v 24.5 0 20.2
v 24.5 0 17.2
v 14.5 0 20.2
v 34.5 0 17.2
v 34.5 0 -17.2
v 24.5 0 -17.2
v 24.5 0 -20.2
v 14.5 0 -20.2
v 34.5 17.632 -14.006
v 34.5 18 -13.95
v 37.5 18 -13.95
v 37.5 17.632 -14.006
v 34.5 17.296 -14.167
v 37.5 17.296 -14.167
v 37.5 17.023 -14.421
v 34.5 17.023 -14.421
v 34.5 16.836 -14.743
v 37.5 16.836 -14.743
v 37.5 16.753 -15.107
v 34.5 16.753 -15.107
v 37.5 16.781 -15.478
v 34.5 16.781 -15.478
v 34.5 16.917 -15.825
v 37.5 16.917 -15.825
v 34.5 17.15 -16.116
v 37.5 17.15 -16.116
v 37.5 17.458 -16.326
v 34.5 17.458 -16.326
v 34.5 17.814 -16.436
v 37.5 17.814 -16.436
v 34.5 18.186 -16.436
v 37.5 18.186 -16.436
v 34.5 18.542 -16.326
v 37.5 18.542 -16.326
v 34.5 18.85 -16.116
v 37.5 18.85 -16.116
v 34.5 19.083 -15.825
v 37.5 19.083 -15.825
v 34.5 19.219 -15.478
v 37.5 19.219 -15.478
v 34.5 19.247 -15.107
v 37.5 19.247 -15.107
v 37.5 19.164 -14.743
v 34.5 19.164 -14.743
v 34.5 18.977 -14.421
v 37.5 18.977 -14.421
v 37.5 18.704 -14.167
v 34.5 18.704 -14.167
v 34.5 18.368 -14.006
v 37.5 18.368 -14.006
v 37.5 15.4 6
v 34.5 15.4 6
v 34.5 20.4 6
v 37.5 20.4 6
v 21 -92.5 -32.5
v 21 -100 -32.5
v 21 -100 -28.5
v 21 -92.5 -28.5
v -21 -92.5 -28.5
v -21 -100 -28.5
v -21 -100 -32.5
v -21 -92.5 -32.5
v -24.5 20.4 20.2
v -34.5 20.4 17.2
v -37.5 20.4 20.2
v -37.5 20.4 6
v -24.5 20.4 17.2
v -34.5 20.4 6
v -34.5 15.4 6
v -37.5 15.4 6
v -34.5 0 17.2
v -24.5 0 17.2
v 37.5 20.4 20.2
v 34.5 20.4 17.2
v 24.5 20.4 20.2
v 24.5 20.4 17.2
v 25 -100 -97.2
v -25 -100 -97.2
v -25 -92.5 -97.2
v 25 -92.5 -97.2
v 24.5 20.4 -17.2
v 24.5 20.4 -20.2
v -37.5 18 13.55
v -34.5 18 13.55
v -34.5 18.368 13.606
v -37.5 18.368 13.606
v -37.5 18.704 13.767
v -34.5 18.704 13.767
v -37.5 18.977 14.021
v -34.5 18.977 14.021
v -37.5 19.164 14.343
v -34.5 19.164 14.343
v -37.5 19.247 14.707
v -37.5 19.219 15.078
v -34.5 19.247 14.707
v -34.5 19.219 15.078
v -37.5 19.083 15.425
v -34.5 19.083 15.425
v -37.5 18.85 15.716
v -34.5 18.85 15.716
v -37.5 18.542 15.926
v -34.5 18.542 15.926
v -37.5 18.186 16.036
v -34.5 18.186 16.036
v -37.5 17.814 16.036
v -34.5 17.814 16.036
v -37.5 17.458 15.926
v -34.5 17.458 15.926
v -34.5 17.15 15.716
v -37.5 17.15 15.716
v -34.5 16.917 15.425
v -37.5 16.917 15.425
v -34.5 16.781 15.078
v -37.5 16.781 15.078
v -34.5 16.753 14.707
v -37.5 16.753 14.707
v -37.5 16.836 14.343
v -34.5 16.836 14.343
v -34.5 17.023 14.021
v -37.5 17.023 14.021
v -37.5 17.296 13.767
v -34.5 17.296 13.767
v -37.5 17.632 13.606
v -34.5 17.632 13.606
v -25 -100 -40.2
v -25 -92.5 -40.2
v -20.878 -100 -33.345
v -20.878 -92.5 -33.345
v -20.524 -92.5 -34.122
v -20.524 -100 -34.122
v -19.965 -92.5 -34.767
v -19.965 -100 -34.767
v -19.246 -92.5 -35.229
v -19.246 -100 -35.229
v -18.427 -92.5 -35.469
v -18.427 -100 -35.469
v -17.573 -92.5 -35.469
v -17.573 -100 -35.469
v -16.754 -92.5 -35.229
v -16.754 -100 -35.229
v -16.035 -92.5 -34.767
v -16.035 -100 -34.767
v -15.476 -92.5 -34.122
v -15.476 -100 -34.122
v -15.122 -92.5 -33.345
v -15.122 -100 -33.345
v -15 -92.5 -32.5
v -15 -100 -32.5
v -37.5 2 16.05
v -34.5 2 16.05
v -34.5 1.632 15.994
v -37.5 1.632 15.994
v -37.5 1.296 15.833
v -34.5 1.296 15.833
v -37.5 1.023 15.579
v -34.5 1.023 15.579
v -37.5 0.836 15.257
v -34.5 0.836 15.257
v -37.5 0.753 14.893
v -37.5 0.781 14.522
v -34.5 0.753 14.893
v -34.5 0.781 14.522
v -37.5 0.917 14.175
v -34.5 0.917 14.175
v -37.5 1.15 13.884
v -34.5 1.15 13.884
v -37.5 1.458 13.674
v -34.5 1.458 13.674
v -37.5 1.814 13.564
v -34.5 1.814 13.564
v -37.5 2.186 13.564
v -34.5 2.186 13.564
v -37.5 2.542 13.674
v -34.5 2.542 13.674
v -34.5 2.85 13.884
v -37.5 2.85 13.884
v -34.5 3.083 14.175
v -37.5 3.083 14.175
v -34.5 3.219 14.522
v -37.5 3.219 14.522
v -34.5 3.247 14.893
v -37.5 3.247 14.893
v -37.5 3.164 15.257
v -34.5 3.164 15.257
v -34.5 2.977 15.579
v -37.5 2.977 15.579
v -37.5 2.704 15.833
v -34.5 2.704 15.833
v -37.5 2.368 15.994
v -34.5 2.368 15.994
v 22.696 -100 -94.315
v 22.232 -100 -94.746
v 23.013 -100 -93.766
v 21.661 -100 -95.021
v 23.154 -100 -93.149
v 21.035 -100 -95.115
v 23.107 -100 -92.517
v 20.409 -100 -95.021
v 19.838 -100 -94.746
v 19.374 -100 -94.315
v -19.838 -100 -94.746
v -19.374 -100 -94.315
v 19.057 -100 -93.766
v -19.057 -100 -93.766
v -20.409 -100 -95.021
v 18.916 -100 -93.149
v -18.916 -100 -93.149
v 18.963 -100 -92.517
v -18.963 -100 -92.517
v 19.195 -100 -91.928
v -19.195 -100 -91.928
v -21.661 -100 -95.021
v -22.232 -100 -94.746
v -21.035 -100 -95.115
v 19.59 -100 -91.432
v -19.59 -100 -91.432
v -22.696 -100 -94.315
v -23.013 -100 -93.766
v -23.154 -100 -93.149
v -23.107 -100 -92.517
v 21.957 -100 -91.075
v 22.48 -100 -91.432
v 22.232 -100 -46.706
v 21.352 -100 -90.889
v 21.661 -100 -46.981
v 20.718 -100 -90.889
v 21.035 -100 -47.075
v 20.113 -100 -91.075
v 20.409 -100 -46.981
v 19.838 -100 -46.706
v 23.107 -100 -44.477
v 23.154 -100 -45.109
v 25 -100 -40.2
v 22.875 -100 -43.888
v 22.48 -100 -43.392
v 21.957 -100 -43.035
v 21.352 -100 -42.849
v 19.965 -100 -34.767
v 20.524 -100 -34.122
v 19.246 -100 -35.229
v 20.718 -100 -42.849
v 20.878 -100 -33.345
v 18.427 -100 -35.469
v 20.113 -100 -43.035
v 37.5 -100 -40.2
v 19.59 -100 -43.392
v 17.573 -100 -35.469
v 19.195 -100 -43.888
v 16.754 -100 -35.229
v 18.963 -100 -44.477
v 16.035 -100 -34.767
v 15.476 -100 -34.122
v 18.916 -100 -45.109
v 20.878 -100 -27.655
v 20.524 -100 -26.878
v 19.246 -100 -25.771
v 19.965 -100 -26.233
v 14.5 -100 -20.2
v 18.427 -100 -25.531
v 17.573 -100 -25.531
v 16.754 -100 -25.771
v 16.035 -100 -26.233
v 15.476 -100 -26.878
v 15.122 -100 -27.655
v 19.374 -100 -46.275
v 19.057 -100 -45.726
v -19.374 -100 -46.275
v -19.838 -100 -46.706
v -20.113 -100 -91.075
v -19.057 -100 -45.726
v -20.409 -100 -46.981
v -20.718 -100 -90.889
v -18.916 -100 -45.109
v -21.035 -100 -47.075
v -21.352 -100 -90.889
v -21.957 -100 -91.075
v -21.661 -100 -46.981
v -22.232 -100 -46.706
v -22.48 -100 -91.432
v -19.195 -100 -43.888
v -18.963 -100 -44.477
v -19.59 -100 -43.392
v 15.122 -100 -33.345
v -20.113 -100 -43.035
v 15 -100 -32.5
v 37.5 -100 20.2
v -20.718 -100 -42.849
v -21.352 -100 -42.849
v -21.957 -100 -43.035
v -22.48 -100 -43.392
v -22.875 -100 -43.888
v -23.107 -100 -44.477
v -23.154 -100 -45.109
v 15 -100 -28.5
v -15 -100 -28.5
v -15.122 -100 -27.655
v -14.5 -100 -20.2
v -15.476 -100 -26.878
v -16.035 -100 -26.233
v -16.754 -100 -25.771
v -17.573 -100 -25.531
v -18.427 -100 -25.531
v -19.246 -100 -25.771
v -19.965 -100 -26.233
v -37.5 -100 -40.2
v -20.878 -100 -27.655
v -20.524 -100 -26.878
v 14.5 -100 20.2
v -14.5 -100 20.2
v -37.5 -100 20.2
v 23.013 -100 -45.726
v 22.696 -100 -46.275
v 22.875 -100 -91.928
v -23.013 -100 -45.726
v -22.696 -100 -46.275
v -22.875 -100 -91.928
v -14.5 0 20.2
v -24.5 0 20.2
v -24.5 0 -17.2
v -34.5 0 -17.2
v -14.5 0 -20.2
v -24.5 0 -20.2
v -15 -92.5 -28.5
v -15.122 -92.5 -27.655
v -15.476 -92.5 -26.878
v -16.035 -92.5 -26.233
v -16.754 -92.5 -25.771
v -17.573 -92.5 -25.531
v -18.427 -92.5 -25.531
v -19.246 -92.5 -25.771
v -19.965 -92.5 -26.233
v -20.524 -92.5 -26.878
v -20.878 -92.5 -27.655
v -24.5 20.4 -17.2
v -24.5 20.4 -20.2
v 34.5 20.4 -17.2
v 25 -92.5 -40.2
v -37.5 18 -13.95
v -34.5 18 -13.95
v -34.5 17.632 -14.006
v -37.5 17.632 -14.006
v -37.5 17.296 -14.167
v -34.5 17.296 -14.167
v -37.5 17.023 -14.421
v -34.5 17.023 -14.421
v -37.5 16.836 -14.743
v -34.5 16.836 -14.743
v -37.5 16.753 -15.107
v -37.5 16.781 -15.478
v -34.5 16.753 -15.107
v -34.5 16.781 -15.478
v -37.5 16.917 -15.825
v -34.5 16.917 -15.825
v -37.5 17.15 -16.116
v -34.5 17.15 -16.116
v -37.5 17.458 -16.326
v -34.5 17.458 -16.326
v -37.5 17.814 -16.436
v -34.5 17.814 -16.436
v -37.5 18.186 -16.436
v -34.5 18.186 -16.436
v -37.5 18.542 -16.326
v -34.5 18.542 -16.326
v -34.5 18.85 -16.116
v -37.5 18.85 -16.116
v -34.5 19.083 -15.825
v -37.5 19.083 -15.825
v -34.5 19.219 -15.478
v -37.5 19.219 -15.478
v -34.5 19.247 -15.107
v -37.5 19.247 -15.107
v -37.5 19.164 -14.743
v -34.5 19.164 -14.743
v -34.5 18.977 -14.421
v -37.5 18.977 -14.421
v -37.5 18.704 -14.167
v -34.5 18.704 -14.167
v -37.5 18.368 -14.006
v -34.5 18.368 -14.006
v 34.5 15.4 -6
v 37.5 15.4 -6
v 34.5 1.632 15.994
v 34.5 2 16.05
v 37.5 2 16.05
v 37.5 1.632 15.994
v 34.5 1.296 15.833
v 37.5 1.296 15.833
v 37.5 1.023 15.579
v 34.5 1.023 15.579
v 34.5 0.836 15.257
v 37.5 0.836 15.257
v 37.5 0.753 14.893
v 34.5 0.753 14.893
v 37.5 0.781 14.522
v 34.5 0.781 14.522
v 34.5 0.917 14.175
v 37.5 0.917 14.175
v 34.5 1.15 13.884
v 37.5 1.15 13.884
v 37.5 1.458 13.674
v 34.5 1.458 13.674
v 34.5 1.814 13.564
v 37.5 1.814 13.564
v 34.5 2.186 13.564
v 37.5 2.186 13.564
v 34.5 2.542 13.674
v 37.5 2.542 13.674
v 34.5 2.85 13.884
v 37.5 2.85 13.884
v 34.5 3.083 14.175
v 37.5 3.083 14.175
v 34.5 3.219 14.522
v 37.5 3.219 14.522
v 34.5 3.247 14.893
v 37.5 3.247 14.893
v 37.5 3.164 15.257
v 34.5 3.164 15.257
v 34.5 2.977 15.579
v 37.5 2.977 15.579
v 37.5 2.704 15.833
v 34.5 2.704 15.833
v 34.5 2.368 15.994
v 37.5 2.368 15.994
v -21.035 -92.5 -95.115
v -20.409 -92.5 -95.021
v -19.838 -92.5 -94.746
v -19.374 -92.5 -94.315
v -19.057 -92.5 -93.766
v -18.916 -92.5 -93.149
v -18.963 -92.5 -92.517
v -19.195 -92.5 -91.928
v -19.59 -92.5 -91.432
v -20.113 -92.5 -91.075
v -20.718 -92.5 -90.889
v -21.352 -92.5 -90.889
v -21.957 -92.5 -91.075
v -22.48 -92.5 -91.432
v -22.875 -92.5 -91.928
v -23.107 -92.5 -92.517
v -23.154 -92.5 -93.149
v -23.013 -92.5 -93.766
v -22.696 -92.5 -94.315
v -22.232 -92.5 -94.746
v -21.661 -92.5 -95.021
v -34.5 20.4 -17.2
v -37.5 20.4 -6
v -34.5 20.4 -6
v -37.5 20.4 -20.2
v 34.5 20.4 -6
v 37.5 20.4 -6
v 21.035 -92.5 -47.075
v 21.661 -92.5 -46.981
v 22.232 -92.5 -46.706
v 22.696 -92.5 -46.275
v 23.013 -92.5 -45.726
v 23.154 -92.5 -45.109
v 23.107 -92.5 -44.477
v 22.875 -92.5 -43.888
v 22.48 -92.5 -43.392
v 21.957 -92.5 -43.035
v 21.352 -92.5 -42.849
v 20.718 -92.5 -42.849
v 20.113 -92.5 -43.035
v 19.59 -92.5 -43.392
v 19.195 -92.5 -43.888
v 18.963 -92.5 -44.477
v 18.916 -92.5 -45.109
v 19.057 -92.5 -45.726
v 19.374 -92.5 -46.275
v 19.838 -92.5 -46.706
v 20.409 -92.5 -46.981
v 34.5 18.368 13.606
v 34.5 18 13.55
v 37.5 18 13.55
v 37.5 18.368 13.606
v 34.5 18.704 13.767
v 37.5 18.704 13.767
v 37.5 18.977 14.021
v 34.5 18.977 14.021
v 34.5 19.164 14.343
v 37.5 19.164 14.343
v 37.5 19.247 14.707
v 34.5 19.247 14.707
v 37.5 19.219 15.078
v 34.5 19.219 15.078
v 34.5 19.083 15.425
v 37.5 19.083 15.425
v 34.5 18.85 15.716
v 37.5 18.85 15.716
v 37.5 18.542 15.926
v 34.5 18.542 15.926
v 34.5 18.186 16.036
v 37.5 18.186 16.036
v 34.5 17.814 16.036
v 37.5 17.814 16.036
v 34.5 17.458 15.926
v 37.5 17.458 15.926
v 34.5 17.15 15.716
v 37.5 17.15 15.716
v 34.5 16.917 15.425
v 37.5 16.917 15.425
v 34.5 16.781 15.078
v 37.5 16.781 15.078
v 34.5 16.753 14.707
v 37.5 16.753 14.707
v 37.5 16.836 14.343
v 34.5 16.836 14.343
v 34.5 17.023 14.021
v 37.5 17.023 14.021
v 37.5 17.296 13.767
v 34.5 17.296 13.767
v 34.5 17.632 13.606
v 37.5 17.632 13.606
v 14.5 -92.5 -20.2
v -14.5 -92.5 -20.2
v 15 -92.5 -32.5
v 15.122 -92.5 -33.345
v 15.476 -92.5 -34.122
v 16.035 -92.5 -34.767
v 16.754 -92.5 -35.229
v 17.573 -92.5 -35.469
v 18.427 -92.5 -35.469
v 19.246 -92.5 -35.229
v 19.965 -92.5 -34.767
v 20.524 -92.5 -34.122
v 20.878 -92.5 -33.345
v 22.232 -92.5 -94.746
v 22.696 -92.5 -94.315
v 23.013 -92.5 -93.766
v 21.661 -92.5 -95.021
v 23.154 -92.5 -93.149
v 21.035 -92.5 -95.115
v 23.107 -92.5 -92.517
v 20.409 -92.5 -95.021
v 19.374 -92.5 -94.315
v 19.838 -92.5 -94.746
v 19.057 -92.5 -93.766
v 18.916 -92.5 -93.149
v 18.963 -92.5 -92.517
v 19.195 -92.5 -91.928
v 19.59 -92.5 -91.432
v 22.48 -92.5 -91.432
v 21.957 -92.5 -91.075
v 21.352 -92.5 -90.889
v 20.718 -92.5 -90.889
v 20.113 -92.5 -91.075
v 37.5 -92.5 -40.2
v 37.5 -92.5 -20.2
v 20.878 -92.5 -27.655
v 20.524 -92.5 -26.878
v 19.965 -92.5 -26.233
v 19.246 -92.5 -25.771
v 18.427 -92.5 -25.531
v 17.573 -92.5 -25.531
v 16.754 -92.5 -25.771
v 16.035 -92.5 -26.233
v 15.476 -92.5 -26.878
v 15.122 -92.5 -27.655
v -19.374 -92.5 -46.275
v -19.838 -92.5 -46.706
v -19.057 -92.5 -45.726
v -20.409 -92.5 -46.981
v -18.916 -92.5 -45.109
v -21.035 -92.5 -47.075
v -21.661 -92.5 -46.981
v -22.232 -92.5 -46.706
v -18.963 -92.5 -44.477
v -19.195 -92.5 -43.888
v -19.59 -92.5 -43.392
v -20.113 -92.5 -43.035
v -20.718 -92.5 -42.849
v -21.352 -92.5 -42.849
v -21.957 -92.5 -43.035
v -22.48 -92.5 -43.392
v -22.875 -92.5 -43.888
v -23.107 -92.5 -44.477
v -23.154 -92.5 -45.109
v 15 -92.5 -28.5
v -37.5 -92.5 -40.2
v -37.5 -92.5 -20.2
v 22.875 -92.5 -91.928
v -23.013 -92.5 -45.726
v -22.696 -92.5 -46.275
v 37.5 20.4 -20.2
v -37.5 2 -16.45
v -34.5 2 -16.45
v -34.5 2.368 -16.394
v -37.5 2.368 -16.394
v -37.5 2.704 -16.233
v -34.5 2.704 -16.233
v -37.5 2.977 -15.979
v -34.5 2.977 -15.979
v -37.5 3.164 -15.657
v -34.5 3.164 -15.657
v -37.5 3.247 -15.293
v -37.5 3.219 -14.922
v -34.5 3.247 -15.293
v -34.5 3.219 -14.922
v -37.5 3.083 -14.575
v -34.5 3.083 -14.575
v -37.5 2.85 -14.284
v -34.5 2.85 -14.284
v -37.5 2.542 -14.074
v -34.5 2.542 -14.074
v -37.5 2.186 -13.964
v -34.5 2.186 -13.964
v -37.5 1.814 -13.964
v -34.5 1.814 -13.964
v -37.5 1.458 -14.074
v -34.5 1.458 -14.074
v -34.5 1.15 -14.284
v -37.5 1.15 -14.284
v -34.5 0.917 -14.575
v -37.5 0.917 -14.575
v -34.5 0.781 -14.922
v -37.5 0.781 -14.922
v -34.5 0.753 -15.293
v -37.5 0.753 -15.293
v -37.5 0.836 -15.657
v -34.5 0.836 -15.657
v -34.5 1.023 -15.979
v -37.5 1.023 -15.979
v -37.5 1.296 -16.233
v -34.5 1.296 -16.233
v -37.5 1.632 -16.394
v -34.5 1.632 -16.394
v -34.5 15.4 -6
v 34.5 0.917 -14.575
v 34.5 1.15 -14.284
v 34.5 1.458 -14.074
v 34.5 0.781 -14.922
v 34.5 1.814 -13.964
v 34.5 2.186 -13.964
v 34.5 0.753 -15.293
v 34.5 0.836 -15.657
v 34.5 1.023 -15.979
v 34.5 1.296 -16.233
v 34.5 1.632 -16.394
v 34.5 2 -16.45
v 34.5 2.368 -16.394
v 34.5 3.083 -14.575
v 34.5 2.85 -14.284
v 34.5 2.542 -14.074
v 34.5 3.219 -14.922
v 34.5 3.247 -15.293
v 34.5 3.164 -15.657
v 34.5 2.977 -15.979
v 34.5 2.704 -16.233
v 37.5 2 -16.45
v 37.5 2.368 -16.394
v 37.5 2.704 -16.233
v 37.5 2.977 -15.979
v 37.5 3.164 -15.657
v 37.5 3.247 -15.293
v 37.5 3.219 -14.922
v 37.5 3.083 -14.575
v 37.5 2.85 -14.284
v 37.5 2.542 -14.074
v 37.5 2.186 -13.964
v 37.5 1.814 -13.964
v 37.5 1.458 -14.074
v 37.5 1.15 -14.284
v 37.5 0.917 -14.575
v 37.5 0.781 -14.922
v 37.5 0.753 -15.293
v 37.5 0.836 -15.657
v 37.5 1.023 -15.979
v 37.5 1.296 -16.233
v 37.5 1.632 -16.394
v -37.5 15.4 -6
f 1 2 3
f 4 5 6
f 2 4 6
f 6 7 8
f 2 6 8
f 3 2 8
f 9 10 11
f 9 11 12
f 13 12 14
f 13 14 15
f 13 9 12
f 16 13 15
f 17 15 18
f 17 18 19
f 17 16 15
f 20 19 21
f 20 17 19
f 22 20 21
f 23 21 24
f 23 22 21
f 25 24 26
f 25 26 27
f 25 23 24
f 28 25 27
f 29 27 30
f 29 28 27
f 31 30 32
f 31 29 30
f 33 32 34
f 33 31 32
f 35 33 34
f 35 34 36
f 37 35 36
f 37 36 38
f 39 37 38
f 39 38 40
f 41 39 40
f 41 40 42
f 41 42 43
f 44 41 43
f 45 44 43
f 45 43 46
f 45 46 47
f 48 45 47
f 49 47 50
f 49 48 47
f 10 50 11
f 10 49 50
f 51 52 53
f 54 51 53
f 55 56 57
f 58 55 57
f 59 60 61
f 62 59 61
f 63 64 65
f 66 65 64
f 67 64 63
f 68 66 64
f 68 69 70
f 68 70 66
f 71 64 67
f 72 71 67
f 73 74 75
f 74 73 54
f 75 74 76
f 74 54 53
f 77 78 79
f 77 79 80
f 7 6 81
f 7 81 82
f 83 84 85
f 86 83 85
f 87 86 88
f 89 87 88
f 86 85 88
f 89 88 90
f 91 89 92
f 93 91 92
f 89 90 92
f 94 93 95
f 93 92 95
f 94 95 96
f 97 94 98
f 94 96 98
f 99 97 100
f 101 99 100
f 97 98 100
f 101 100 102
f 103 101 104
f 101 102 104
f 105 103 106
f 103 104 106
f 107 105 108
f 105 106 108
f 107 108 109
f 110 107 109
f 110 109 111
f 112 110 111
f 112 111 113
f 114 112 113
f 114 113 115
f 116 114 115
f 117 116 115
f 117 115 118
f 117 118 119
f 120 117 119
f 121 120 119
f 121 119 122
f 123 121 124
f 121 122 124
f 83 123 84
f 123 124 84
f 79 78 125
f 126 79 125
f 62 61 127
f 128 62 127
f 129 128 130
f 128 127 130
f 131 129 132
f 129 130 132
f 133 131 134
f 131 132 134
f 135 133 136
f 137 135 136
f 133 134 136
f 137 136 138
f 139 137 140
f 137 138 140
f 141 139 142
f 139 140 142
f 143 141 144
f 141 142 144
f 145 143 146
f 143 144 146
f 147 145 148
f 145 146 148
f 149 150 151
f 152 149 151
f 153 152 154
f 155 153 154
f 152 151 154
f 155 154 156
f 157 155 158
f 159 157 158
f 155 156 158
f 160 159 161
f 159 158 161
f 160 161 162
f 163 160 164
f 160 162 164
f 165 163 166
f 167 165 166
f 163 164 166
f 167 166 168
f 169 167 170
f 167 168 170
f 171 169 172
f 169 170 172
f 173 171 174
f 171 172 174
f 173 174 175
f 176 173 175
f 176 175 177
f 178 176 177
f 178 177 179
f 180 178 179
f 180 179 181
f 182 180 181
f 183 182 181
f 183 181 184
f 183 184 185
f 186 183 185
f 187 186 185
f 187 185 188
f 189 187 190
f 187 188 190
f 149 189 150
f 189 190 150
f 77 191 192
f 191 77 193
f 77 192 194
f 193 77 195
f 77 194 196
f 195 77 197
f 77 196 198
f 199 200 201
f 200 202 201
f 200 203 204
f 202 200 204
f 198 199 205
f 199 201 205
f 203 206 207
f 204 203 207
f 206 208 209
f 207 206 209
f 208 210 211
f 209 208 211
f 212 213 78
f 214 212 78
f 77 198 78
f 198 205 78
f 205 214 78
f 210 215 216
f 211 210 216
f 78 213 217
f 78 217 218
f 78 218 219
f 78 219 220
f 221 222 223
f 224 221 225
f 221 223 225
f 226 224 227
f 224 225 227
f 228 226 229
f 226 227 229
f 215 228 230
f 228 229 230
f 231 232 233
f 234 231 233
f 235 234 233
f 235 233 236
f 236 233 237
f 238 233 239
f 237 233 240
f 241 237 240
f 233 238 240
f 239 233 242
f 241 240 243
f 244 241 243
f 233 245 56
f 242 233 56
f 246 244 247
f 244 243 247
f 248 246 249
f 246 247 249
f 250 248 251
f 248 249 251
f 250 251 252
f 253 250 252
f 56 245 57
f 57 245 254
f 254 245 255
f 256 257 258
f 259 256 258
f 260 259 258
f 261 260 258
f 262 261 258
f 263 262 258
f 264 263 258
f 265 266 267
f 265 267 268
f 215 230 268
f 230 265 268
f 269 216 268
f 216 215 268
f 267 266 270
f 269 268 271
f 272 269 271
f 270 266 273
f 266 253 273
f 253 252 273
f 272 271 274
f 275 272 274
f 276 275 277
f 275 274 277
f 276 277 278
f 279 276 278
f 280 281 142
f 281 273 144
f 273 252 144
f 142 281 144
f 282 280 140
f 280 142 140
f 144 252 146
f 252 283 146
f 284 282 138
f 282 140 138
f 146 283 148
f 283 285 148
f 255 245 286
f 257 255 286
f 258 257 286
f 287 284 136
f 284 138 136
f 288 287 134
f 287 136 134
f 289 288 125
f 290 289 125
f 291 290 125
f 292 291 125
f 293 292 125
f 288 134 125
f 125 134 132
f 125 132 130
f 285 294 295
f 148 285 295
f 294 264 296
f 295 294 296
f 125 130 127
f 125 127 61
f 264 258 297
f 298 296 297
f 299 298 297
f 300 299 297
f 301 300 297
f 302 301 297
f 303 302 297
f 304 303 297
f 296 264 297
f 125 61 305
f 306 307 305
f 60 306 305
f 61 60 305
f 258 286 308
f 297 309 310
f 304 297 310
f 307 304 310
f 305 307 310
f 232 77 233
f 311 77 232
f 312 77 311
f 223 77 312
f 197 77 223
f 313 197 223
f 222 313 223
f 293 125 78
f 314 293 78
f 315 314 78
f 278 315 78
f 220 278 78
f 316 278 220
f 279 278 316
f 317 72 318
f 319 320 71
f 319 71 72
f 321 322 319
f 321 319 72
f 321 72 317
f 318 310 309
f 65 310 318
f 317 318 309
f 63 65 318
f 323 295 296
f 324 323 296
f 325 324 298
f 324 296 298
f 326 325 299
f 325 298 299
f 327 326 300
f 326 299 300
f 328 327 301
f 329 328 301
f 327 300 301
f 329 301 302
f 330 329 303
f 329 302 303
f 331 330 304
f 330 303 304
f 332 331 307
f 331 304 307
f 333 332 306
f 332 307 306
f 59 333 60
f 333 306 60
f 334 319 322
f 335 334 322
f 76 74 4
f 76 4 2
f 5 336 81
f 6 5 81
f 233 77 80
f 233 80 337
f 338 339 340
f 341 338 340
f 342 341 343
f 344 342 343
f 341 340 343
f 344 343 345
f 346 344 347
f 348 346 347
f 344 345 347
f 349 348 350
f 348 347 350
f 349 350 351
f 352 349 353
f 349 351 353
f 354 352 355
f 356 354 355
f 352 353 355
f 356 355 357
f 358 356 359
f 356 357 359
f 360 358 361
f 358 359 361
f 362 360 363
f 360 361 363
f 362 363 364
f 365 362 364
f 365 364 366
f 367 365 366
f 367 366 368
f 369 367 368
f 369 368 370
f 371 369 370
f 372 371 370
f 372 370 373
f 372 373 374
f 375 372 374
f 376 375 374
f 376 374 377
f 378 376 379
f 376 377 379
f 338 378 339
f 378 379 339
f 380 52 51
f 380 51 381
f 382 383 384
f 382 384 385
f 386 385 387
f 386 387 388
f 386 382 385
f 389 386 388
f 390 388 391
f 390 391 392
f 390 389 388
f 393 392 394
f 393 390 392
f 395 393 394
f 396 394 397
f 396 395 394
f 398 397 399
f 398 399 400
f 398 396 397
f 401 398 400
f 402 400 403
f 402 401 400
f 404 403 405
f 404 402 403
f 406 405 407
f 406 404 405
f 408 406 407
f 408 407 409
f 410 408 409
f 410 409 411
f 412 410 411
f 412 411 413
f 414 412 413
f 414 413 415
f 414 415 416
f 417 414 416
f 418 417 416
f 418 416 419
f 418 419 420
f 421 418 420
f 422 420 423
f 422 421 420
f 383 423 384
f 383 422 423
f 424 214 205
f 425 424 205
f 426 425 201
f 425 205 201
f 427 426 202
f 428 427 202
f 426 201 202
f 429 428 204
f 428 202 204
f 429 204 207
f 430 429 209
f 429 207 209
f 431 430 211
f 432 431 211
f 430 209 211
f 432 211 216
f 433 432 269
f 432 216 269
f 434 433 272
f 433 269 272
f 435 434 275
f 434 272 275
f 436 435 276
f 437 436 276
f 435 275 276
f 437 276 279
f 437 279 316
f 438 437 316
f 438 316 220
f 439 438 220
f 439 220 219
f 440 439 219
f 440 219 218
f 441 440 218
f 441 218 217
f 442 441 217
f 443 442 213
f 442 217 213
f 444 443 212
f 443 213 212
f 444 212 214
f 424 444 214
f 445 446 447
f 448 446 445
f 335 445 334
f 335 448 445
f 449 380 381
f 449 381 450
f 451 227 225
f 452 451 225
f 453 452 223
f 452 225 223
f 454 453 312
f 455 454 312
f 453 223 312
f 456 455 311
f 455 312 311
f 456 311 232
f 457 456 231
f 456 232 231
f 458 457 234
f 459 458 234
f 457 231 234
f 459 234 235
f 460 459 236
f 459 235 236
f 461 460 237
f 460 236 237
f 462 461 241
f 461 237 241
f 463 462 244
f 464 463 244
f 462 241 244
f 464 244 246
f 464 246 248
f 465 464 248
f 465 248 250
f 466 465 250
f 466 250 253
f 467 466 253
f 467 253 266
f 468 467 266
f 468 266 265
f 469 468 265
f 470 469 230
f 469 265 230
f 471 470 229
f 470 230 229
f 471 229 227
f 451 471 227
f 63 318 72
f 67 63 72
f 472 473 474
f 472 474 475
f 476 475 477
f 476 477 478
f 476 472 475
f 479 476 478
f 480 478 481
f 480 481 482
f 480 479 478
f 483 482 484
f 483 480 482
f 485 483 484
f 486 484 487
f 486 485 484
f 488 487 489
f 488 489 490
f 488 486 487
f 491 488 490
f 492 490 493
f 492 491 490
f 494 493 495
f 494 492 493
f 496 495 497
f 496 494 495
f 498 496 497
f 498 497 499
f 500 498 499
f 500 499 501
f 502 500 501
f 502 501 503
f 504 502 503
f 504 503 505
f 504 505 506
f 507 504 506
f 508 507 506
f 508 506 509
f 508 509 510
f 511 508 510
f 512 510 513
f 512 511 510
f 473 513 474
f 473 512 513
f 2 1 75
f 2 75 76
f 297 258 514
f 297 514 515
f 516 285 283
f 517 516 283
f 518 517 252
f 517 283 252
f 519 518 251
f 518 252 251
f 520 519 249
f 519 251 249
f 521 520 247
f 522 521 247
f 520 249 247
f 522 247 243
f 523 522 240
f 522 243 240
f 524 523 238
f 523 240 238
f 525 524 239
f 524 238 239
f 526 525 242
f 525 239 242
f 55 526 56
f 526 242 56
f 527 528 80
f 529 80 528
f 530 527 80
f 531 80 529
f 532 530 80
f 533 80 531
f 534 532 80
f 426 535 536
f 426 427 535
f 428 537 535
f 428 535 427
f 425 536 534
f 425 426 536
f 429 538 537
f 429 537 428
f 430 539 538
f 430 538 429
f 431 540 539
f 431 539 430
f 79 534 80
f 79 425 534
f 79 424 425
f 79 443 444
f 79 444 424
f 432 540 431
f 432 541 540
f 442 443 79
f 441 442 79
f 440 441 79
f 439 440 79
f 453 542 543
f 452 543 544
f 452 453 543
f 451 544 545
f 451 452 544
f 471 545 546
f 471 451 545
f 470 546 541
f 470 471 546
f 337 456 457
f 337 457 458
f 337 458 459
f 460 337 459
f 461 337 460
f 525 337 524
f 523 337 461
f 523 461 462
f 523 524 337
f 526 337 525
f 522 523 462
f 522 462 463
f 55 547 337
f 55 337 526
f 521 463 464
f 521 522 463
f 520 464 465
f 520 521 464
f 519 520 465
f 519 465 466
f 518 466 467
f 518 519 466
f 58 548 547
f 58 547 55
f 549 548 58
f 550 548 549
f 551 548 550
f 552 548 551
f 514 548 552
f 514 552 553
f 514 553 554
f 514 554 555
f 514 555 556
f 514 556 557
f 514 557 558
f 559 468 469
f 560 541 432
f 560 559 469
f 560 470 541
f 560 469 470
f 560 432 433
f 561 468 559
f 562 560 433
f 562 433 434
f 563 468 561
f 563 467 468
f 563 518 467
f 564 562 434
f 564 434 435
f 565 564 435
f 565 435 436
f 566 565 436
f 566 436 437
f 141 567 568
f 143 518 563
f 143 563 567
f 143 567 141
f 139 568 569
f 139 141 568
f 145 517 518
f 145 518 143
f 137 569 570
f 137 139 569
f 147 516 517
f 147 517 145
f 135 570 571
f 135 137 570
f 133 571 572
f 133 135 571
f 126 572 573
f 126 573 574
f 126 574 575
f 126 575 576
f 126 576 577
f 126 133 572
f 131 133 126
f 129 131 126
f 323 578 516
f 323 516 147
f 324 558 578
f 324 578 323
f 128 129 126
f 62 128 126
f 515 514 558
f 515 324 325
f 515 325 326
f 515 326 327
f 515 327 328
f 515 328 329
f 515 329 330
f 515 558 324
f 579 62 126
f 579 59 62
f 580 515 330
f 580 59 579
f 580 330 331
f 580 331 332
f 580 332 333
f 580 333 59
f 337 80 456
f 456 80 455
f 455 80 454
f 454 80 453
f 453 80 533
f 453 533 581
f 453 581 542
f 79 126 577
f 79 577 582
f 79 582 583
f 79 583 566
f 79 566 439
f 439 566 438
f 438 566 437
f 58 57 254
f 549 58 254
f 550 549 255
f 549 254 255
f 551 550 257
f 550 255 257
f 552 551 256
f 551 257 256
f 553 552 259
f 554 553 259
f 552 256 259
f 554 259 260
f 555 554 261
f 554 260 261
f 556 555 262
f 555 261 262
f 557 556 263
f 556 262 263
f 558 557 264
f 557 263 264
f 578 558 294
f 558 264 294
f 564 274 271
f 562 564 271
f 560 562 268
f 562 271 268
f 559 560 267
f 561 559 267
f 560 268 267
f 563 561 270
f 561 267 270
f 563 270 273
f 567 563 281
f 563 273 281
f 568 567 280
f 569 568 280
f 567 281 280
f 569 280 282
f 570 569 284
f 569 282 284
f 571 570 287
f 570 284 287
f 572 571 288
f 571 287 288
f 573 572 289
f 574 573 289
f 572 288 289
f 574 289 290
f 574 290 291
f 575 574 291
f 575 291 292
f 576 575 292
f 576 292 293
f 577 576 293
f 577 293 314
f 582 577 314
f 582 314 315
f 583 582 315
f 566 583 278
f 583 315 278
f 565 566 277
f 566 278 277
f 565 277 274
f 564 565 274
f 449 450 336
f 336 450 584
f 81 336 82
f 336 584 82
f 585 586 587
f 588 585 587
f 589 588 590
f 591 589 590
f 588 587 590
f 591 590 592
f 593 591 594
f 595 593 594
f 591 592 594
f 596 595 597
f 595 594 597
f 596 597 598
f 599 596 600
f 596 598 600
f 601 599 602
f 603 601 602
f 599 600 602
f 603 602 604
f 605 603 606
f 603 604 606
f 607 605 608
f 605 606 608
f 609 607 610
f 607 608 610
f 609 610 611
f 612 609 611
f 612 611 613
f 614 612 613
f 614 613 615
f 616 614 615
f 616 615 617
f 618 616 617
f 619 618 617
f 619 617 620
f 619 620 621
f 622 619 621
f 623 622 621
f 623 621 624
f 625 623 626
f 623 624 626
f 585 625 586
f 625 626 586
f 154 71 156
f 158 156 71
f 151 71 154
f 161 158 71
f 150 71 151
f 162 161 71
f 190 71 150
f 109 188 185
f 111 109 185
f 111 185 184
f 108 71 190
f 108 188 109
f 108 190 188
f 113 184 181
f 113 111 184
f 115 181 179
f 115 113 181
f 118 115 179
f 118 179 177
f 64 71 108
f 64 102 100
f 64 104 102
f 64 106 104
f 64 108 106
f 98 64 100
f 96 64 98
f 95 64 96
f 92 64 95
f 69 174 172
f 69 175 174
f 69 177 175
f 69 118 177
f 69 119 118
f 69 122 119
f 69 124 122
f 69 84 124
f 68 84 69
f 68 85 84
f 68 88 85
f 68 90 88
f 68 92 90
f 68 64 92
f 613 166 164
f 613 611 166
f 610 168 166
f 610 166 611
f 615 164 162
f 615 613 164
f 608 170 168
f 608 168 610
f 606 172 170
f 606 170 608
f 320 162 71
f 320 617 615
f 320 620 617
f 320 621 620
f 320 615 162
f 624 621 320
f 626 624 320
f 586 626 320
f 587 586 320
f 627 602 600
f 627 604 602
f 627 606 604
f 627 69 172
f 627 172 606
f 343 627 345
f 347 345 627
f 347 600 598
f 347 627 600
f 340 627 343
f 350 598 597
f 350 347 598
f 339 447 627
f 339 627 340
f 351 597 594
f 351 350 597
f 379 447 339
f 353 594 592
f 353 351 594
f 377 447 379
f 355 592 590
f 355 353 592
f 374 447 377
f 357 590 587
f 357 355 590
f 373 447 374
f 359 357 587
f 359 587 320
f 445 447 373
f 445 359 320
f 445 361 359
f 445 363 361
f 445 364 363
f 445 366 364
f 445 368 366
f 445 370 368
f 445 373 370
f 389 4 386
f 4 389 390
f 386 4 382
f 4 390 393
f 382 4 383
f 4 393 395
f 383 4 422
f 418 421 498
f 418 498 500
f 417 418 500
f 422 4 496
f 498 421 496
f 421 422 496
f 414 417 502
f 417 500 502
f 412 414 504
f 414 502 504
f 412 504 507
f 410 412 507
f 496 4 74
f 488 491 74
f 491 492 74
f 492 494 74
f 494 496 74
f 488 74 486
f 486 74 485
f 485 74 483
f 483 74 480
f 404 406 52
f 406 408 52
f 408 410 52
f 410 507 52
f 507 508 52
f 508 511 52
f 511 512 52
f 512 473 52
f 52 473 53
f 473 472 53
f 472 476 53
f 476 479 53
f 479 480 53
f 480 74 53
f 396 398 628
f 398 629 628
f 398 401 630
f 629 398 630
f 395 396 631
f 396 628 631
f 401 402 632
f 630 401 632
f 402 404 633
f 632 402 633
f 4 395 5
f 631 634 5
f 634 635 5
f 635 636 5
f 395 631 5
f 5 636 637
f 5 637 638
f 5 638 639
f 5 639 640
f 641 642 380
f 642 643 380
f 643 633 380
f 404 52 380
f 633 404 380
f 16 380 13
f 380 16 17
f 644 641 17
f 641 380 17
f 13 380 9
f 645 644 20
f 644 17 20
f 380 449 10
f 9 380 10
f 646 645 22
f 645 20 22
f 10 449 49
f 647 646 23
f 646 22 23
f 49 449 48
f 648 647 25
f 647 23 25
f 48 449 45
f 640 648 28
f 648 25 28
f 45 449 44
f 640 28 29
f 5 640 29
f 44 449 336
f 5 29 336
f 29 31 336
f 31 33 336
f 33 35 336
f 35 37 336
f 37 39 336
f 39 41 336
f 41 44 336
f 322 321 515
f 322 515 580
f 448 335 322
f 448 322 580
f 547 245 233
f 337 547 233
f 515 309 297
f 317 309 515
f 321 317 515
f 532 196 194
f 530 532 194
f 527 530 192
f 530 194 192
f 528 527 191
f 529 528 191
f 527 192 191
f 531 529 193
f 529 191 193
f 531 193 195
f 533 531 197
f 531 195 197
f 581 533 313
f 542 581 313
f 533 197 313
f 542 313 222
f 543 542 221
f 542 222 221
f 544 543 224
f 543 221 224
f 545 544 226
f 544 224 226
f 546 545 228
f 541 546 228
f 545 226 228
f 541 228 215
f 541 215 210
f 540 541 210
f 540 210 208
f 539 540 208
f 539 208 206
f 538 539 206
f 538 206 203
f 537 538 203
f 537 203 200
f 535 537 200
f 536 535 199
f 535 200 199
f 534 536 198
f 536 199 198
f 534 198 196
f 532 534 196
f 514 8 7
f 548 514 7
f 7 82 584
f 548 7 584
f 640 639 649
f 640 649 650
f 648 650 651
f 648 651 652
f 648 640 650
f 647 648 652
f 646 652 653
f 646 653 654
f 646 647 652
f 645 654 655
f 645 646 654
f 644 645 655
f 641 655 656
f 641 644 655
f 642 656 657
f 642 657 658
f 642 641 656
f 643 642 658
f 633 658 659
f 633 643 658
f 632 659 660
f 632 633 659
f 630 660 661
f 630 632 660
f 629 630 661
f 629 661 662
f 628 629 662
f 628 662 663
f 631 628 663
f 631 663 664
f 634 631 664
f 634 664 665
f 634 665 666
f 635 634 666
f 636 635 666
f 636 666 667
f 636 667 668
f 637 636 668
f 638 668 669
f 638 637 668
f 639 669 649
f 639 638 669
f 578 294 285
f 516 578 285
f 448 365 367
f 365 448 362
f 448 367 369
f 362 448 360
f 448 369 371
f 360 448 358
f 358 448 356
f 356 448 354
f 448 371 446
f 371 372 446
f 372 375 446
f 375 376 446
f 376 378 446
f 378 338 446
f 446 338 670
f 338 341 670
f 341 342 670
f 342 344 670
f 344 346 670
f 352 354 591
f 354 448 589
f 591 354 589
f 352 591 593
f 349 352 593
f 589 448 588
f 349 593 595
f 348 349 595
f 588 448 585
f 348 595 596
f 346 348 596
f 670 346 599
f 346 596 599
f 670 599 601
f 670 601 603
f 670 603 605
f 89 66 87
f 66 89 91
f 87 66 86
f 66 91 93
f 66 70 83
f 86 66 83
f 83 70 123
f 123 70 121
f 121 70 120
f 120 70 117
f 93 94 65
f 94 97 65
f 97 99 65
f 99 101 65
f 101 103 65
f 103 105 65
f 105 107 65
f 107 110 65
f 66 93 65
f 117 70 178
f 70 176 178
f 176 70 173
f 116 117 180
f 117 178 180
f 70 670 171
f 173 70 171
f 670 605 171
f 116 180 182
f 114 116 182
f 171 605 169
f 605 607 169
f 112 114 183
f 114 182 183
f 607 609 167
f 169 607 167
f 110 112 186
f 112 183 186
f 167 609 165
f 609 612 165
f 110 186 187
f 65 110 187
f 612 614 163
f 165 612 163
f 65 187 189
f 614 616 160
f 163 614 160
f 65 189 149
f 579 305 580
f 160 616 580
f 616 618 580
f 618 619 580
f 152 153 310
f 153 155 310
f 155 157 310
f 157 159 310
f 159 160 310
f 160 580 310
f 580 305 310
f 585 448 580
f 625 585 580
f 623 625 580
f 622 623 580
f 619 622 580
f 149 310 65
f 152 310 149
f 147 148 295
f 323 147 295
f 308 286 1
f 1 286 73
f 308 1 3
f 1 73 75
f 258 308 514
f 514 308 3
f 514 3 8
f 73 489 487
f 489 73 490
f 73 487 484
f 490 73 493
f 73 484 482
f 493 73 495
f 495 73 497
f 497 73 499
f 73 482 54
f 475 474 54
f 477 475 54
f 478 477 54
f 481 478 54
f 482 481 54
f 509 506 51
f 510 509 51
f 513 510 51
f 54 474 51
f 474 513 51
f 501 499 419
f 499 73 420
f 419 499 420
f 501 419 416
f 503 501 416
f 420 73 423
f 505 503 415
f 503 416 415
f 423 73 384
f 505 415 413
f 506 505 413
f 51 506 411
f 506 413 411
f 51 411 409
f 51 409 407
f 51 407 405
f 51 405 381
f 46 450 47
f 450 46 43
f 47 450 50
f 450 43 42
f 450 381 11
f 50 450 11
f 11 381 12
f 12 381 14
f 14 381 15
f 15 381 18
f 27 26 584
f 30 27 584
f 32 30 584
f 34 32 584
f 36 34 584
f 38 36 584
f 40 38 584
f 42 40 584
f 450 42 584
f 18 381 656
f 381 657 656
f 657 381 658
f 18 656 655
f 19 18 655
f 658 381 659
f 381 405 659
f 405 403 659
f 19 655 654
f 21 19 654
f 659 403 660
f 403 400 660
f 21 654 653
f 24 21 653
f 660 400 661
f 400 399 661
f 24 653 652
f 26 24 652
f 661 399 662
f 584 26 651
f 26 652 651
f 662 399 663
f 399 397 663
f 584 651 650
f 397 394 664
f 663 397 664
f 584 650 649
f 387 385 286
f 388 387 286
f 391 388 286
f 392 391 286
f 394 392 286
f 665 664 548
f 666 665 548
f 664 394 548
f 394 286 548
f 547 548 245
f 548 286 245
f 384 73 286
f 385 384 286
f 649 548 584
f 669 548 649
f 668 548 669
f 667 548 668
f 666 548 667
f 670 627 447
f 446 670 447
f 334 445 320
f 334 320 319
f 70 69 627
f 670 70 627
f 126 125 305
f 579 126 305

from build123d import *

# Parameters (mm, degrees)
BOSS_EXTRUDE1_START = -34.5
SKETCH2_W           = 34.4
SKETCH2_H           = 20.4
SKETCH2_R           = 1.25
BOSS_EXTRUDE1_DEPTH = 3
SKETCH1_W           = 13
SKETCH1_H           = 3
BOSS_EXTRUDE2_DEPTH = 20.4
SKETCH1_3_W         = 20
SKETCH1_3_H         = 34.4
SKETCH1_3_W_2       = 10
SKETCH1_3_H_2       = 3
SKETCH1_3_W_3       = 3
BOSS_EXTRUDE3_DEPTH = 3
SKETCH1_4_W         = 3
SKETCH1_4_H         = 34.4
SKETCH1_4_W_2       = 10
SKETCH1_4_H_2       = 3
SKETCH1_4_W_3       = 20
BOSS_EXTRUDE4_DEPTH = 100
SKETCH4_W           = 12
SKETCH4_H           = 10
CUT_EXTRUDE1_DEPTH  = 132
SKETCH7_W           = 50
SKETCH7_H           = 57
SKETCH7_R           = 2.125
BOSS_EXTRUDE5_DEPTH = 7.5


with BuildPart() as part:
    # Sketch2 → Boss-Extrude1 (new body)
    with BuildSketch(Plane(origin=(0, 0, 0), x_dir=(0, 0, -1), z_dir=(1, 0, 0)).offset(BOSS_EXTRUDE1_START)):
        with Locations((0, 10.2)):
            Rectangle(SKETCH2_W, SKETCH2_H)
        with Locations((-14.8, 18)):
            Circle(SKETCH2_R, mode=Mode.SUBTRACT)
        with Locations(Location((-14.8, 2, 0), (0, 0, 180))):
            Circle(SKETCH2_R, mode=Mode.SUBTRACT)
        with Locations((15.2, 2)):
            Circle(SKETCH2_R, mode=Mode.SUBTRACT)
        with Locations(Location((15.2, 18, 0), (0, 0, 180))):
            Circle(SKETCH2_R, mode=Mode.SUBTRACT)
    extrude(amount=-BOSS_EXTRUDE1_DEPTH)

    # Sketch1 → Boss-Extrude2 (add)
    with BuildSketch(Plane(origin=(0, 0, 0), x_dir=(1, 0, 0), z_dir=(0, 1, 0))):
        with Locations((-31, -18.7)):
            Rectangle(SKETCH1_W, SKETCH1_H)
        with Locations((-31, 18.7)):
            Rectangle(SKETCH1_W, SKETCH1_H)
    extrude(amount=BOSS_EXTRUDE2_DEPTH)

    # Sketch1<3> → Boss-Extrude3 (add)
    with BuildSketch(Plane(origin=(0, 0, 0), x_dir=(1, 0, 0), z_dir=(0, 1, 0))):
        with Locations((-24.5, 0)):
            Rectangle(SKETCH1_3_W, SKETCH1_3_H)
        with Locations((-19.5, -18.7)):
            Rectangle(SKETCH1_3_W_2, SKETCH1_3_H_2)
        Polygon((-24.5, -20.2), (-24.5, -17.2), (-34.5, -17.2), (-37.5, -17.2), (-37.5, -20.2), align=None)
        with Locations((-36, 0)):
            Rectangle(SKETCH1_3_W_3, SKETCH1_3_H)
        Polygon((-34.5, 17.2), (-24.5, 17.2), (-24.5, 20.2), (-37.5, 20.2), (-37.5, 17.2), align=None)
        with Locations((-19.5, 18.7)):
            Rectangle(SKETCH1_3_W_2, SKETCH1_3_H_2)
    extrude(amount=-BOSS_EXTRUDE3_DEPTH)

    # Sketch1<4> → Boss-Extrude4 (add)
    with BuildSketch(Plane(origin=(0, 0, 0), x_dir=(1, 0, 0), z_dir=(0, 1, 0))):
        with Locations((-36, 0)):
            Rectangle(SKETCH1_4_W, SKETCH1_4_H)
        Polygon((-24.5, -20.2), (-24.5, -17.2), (-34.5, -17.2), (-37.5, -17.2), (-37.5, -20.2), align=None)
        with Locations((-19.5, -18.7)):
            Rectangle(SKETCH1_4_W_2, SKETCH1_4_H_2)
        with Locations((-24.5, 0)):
            Rectangle(SKETCH1_4_W_3, SKETCH1_4_H)
        Polygon((-34.5, 17.2), (-24.5, 17.2), (-24.5, 20.2), (-37.5, 20.2), (-37.5, 17.2), align=None)
        with Locations((-19.5, 18.7)):
            Rectangle(SKETCH1_4_W_2, SKETCH1_4_H_2)
    extrude(amount=-BOSS_EXTRUDE4_DEPTH)

    # Sketch4 → Cut-Extrude1 (cut)
    with BuildSketch(Plane(origin=(-34.5, 0, 0), x_dir=(0, 0, -1), z_dir=(1, 0, 0))):
        with Locations((0, 20.4)):
            Rectangle(SKETCH4_W, SKETCH4_H)
    extrude(amount=-CUT_EXTRUDE1_DEPTH, mode=Mode.SUBTRACT)


with BuildPart() as body_2:
    # Mirror6: mirrored copy
    add(part.part.mirror(Plane(origin=(0, 0, 0), x_dir=(0, 0, 1), z_dir=(1, 0, 0))))


with BuildPart() as part_1:
    add(part.part)

    add(body_2.part)  # Boss-Extrude5 merges body 2
    # Sketch7 → Boss-Extrude5 (add)
    # profile 1 of 2: a face of its own
    with BuildSketch(Plane.XZ.offset(100)):
        Polygon((-14.5, -20.2), (14.5, -20.2), (37.5, -20.2), (37.5, -40.2), (-37.5, -40.2), (-37.5, -20.2), align=None)
        with BuildLine():
            ThreePointArc((-15, -28.5), (-18, -25.5), (-21, -28.5))
            Line((-21, -28.5), (-21, -32.5))
            ThreePointArc((-21, -32.5), (-18, -35.5), (-15, -32.5))
            Line((-15, -32.5), (-15, -28.5))
        make_face(mode=Mode.SUBTRACT)
        with BuildLine():
            ThreePointArc((21, -28.5), (18, -25.5), (15, -28.5))
            Line((15, -28.5), (15, -32.5))
            ThreePointArc((15, -32.5), (18, -35.5), (21, -32.5))
            Line((21, -32.5), (21, -28.5))
        make_face(mode=Mode.SUBTRACT)
    # profile 2 of 2: a face of its own
    with BuildSketch(Plane.XZ.offset(100)):
        with Locations((0, -68.7)):
            Rectangle(SKETCH7_W, SKETCH7_H)
        with Locations(Location((-21.035, -92.99, 0), (0, 0, 270))):
            Circle(SKETCH7_R, mode=Mode.SUBTRACT)
        with Locations(Location((21.035, -92.99, 0), (0, 0, 270))):
            Circle(SKETCH7_R, mode=Mode.SUBTRACT)
        with Locations(Location((-21.035, -44.95, 0), (0, 0, 270))):
            Circle(SKETCH7_R, mode=Mode.SUBTRACT)
        with Locations(Location((21.035, -44.95, 0), (0, 0, 270))):
            Circle(SKETCH7_R, mode=Mode.SUBTRACT)
    extrude(amount=-BOSS_EXTRUDE5_DEPTH)


solid = part_1.part
